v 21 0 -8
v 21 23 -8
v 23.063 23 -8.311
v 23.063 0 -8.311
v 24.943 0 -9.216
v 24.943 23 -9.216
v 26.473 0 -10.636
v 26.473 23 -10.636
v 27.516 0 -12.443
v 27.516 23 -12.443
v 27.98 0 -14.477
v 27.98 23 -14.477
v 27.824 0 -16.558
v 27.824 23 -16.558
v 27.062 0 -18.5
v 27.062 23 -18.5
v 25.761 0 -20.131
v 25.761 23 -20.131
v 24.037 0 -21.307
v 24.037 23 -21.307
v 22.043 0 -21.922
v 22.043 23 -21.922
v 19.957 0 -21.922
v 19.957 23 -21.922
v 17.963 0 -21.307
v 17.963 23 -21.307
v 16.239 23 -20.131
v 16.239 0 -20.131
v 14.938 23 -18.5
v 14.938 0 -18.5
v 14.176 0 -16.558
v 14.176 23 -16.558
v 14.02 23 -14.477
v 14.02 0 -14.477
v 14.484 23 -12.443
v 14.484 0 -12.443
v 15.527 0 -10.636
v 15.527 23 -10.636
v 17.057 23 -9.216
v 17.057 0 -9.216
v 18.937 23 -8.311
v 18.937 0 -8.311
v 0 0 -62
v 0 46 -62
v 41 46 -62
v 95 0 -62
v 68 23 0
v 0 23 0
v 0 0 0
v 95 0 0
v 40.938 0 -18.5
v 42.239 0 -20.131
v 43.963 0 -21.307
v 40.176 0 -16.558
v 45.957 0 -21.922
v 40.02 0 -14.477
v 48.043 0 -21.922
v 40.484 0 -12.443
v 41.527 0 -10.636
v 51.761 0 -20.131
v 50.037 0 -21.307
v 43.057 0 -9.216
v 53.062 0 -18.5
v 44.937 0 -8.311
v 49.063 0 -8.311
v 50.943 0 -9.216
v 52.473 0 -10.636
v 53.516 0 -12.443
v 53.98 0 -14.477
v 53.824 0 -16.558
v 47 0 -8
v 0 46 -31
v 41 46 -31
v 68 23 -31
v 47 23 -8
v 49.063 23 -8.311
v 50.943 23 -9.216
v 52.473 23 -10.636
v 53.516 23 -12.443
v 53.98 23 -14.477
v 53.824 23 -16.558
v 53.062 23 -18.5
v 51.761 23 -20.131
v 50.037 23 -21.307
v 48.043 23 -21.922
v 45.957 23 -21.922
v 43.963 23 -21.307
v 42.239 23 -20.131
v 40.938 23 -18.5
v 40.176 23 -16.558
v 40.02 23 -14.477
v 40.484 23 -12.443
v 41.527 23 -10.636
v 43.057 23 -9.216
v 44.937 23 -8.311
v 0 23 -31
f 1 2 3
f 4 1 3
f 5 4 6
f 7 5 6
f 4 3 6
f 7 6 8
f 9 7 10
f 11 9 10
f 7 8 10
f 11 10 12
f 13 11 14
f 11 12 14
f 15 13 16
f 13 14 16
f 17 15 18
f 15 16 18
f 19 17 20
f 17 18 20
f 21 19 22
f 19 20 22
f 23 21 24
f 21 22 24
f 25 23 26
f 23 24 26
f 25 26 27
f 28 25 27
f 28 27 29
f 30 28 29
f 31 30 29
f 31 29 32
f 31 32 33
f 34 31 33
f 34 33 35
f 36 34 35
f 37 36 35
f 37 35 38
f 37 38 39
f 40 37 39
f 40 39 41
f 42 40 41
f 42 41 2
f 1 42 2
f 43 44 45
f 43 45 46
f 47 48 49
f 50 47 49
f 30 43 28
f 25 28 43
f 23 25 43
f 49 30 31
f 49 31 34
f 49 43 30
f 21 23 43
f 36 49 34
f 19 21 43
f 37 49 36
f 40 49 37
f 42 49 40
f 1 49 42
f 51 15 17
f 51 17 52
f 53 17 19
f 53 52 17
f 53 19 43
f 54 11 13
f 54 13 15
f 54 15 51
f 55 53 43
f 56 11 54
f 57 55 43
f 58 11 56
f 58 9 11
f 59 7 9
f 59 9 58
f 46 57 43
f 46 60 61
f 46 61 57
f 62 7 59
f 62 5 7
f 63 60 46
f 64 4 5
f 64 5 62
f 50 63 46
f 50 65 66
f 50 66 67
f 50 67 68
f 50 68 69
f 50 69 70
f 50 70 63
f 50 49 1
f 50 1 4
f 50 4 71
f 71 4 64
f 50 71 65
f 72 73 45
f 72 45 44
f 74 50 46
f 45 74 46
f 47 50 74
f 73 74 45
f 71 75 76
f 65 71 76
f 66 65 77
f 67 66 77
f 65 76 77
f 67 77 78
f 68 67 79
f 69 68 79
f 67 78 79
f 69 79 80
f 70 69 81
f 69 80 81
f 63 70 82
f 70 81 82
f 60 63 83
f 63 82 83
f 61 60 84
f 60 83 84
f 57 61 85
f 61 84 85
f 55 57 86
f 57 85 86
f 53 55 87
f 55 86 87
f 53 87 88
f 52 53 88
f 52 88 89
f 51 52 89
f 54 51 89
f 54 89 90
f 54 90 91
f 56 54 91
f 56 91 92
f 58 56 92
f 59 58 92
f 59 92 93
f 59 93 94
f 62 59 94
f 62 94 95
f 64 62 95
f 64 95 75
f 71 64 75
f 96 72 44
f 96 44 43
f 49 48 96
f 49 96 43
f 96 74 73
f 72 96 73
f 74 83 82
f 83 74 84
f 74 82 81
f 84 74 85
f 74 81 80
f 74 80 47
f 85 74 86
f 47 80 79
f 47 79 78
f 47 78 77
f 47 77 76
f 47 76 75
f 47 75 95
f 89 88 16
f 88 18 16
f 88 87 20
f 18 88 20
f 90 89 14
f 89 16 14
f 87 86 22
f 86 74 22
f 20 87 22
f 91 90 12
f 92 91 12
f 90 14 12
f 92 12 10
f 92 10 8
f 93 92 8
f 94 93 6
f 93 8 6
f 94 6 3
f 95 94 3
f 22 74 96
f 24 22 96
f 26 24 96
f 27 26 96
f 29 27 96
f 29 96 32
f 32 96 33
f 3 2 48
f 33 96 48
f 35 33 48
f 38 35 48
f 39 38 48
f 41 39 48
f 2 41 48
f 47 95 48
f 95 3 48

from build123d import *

# Parameters (mm, degrees)
EXTRUDE_1_DEPTH     = 62
SKETCH_2_W          = 31
SKETCH_2_H          = 23
CUT_EXTRUDE_1_DEPTH = 70
SKETCH_3_R          = 7
CUT_EXTRUDE_2_DEPTH = 62


with BuildPart() as part:
    # 스케치1 → 보스-돌출1 (new body)
    with BuildSketch(Plane.XY):
        Polygon((0, 0), (95, 0), (41, 46), (0, 46), align=None)
    extrude(amount=-EXTRUDE_1_DEPTH)

    # 스케치2 → 컷-돌출1 (cut)
    with BuildSketch(Plane.ZY):
        with Locations((-15.5, 34.5)):
            Rectangle(SKETCH_2_W, SKETCH_2_H)
    extrude(amount=-CUT_EXTRUDE_1_DEPTH, mode=Mode.SUBTRACT)

    # 스케치3 → 컷-돌출2 (cut)
    with BuildSketch(Plane(origin=(0, 23, 0), x_dir=(1, 0, 0), z_dir=(0, 1, 0))):
        with Locations(Location((21, 15, 0), (0, 0, 270))):
            Circle(SKETCH_3_R)
        with Locations(Location((47, 15, 0), (0, 0, 270))):
            Circle(SKETCH_3_R)
    extrude(amount=-CUT_EXTRUDE_2_DEPTH, mode=Mode.SUBTRACT)


solid = part.part
